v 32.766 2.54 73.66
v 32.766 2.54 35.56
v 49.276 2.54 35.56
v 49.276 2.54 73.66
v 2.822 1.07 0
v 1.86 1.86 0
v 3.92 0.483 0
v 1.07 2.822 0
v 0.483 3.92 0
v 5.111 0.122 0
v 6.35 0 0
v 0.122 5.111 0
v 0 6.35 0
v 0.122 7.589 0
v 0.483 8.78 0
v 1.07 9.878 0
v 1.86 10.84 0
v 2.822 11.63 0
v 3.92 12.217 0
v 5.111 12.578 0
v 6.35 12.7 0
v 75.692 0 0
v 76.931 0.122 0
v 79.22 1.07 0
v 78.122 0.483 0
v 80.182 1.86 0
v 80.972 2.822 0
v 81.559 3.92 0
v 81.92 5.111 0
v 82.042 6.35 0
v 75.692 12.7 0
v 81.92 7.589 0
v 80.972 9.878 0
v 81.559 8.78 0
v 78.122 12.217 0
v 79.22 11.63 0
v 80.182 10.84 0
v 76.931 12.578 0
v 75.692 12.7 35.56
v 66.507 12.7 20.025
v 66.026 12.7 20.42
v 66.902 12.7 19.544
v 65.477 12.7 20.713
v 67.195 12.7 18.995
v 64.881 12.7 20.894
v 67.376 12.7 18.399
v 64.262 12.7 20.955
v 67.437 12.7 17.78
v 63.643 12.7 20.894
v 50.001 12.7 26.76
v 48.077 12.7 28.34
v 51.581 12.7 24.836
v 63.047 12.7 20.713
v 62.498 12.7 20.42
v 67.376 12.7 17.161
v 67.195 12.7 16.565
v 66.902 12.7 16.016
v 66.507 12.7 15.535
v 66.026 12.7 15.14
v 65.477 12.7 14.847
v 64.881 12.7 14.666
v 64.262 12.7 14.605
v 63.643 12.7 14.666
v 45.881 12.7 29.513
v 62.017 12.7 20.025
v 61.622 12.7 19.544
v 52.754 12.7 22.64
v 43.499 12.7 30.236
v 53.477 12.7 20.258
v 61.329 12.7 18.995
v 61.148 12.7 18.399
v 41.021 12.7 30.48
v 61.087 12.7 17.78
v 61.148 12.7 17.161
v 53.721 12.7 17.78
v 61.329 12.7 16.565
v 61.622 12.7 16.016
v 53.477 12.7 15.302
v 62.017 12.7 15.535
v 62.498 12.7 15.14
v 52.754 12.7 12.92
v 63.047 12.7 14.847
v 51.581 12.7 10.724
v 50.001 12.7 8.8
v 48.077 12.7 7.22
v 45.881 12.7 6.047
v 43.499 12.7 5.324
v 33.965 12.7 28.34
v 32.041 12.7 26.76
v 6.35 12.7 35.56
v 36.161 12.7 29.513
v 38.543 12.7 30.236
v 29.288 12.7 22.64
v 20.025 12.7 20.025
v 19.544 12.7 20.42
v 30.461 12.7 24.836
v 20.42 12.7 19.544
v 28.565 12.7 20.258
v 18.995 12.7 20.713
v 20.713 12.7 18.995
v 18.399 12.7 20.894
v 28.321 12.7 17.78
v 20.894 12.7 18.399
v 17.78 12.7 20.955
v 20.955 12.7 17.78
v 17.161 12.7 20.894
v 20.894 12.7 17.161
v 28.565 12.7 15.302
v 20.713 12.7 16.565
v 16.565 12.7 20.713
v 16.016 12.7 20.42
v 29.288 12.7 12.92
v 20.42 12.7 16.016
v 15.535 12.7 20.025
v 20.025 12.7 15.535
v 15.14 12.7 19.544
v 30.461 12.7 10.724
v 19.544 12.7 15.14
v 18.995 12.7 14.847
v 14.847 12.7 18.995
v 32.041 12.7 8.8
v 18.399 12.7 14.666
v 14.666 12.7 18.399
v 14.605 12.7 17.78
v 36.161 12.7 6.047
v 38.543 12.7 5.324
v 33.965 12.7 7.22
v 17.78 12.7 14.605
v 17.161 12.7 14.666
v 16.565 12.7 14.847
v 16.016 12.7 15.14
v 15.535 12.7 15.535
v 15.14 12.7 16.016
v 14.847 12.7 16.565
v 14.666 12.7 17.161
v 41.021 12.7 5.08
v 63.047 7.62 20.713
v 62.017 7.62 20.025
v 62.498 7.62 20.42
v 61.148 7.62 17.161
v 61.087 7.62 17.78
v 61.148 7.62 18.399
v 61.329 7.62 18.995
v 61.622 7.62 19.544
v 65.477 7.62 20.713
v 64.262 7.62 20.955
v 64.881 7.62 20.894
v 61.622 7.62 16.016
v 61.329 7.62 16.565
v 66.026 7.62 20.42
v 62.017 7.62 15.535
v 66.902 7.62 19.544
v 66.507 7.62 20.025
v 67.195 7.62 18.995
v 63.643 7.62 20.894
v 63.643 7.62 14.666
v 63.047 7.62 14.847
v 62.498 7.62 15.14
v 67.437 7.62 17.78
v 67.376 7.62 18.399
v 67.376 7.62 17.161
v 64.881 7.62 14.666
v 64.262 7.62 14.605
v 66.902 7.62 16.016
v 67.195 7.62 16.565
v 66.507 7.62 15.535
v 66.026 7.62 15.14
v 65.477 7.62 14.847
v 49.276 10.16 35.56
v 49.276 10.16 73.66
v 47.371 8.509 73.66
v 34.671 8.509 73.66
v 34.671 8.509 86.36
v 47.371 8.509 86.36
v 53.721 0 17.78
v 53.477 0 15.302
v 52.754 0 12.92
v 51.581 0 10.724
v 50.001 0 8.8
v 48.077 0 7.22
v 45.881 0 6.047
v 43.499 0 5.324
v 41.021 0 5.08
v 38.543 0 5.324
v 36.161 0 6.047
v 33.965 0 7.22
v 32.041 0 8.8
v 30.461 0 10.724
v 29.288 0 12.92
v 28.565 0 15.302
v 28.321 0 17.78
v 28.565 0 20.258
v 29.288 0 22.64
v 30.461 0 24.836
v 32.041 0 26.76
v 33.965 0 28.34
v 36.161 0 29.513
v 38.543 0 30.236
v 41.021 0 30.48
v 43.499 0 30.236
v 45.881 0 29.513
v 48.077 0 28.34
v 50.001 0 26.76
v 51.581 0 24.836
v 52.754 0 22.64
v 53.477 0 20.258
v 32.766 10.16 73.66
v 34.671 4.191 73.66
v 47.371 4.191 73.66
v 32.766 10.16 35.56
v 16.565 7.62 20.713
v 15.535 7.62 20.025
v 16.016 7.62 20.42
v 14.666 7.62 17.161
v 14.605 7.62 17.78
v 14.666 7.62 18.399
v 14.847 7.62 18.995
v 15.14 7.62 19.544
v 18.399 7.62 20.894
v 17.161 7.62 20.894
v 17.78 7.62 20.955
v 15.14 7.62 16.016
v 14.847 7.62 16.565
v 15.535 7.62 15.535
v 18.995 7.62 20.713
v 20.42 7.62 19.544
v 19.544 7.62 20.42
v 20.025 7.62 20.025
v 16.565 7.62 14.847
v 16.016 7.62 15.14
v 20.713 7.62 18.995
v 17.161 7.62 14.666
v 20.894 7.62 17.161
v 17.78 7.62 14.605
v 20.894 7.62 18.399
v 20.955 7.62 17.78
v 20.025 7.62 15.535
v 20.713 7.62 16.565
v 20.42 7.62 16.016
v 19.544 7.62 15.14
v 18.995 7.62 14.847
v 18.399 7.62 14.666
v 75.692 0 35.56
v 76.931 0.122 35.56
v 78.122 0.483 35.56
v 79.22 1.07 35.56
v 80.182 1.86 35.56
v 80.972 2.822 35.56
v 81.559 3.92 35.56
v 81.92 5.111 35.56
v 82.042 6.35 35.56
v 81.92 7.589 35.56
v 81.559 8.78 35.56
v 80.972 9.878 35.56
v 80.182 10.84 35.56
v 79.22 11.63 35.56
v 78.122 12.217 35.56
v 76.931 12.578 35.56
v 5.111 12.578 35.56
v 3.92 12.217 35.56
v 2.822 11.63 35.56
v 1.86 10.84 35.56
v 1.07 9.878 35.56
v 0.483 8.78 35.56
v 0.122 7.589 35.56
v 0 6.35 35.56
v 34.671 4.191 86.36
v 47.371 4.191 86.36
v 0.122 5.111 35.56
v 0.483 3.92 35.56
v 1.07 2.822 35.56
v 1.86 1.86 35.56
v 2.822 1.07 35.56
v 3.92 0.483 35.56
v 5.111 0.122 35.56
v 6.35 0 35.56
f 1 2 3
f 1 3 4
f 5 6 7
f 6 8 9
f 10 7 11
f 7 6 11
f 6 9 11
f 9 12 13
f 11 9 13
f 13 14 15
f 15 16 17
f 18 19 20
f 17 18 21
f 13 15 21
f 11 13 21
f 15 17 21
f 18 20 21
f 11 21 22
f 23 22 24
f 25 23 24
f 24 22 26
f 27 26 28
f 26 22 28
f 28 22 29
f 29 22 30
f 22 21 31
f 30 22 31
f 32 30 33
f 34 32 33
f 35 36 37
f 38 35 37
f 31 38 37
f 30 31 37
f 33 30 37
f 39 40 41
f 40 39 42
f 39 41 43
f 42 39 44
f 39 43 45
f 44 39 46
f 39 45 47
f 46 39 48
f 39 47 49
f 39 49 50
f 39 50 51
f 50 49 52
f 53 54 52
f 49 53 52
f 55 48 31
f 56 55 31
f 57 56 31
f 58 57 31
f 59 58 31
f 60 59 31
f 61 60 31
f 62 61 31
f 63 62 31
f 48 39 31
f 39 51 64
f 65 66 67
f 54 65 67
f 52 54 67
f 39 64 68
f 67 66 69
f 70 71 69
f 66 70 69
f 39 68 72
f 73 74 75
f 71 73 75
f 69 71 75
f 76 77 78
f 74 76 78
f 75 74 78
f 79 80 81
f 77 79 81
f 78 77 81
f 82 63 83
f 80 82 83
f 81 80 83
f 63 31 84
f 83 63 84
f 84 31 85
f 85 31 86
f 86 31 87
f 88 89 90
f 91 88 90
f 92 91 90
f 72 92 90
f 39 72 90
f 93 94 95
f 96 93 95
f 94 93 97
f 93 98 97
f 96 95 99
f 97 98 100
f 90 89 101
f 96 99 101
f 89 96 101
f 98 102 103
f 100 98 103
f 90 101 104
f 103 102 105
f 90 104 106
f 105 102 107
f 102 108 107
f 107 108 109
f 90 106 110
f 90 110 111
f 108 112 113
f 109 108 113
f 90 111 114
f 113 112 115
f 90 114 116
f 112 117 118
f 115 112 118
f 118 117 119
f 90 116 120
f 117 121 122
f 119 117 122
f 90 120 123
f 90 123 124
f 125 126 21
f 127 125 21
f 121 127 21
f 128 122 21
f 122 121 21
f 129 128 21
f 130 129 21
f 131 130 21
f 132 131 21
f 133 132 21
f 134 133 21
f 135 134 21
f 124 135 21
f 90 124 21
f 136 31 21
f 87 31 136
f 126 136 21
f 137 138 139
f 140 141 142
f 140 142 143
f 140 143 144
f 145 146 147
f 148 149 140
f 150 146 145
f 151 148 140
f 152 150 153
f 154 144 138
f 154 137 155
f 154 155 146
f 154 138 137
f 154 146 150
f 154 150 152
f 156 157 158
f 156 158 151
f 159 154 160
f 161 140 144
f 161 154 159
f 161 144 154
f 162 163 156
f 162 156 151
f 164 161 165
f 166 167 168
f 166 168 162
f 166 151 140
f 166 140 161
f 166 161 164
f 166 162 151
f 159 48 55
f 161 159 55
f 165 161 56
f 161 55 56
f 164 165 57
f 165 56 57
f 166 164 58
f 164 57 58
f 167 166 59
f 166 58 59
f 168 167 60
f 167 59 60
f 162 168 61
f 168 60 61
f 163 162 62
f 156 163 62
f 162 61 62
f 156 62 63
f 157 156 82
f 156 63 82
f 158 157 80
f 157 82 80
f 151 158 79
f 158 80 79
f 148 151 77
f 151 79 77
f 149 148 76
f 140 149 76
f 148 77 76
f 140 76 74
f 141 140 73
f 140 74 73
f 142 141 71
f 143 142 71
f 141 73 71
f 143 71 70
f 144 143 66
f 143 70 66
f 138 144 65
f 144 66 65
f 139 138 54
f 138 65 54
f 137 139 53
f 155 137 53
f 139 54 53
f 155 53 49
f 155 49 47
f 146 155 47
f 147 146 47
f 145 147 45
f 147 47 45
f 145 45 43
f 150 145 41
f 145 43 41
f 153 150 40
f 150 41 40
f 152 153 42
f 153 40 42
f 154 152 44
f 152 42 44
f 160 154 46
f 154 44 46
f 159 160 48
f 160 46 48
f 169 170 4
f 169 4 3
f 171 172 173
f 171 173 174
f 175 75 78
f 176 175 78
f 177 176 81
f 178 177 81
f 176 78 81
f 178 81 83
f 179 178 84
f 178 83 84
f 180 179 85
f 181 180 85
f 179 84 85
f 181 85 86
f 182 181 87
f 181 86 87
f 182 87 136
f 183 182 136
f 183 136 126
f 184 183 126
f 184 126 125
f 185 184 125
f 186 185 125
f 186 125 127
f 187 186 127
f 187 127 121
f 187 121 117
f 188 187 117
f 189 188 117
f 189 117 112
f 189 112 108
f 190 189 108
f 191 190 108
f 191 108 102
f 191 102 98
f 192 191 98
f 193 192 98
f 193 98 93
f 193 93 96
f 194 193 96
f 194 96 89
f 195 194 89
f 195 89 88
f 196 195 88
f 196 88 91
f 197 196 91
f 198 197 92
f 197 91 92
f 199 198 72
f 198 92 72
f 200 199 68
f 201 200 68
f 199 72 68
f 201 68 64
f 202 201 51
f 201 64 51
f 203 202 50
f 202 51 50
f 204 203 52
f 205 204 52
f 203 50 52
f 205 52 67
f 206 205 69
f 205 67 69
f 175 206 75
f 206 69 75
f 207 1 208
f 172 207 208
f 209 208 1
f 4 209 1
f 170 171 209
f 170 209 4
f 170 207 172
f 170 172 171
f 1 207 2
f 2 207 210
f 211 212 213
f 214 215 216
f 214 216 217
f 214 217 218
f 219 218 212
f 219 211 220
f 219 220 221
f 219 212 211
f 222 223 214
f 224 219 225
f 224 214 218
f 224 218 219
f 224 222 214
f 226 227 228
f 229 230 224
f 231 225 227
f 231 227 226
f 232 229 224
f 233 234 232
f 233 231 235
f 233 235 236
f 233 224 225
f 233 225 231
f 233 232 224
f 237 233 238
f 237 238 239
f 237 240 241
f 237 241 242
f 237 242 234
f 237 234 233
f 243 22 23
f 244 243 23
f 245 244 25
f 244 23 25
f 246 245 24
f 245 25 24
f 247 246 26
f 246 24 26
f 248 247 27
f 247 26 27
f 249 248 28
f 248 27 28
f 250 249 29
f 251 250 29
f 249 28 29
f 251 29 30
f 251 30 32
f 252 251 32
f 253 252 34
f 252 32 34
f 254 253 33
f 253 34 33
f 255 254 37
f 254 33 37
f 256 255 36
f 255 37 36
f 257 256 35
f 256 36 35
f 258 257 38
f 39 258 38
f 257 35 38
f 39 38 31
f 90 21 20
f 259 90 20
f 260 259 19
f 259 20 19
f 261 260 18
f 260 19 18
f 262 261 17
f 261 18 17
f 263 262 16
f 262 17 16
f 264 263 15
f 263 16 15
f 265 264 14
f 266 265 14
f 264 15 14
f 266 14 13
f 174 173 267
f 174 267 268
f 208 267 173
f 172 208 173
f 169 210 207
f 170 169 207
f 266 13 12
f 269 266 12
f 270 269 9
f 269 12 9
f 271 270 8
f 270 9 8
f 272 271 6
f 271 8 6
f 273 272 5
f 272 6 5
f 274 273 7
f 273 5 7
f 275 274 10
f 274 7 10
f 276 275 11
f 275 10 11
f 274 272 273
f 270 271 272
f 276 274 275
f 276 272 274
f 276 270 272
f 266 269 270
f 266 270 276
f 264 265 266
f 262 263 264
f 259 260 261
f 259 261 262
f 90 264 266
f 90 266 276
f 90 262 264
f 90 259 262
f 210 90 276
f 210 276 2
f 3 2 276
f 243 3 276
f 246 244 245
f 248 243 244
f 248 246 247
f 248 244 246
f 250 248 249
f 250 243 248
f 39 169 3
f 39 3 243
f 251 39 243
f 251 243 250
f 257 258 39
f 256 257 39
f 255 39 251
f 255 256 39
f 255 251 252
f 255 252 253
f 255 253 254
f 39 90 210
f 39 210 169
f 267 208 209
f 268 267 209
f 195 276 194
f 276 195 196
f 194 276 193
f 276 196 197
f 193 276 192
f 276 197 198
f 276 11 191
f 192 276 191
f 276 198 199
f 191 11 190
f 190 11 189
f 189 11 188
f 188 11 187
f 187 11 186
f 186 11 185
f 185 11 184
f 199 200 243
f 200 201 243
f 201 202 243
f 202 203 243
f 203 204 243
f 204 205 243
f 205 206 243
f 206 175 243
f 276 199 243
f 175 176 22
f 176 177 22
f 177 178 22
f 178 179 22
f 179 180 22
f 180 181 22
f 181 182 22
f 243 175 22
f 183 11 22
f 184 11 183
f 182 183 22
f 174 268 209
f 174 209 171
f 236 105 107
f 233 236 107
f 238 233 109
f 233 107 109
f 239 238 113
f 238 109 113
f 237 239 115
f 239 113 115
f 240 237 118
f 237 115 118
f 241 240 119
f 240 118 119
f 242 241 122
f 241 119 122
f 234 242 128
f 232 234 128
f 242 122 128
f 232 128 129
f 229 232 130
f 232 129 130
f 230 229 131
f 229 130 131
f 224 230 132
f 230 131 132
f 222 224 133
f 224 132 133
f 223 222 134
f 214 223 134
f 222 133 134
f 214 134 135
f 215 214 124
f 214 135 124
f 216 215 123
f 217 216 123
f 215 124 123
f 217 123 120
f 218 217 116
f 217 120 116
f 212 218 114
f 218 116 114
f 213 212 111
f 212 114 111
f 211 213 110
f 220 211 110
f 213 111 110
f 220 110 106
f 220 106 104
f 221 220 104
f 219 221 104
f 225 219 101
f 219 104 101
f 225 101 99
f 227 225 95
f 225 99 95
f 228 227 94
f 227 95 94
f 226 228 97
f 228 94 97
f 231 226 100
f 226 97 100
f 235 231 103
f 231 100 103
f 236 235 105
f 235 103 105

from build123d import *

# Parameters (mm, degrees)
BOSS_EXTRUDE1_DEPTH = 35.56
SKETCH2_W           = 16.51
SKETCH2_H           = 38.1
BOSS_EXTRUDE2_DEPTH = 12.7
SKETCH3_W           = 38.1
SKETCH3_H           = 2.54
CUT_EXTRUDE1_DEPTH  = 50.276
SKETCH4_W           = 12.7
SKETCH4_H           = 4.318
BOSS_EXTRUDE3_DEPTH = 12.7
SKETCH5_R           = 12.7
CUT_EXTRUDE2_DEPTH  = 13.7
SKETCH6_R           = 3.175
CUT_EXTRUDE3_DEPTH  = 5.08


with BuildPart() as part:
    # Sketch1 → Boss-Extrude1 (new body)
    with BuildSketch(Plane.XY):
        with BuildLine():
            ThreePointArc((0, 6.35), (1.859871939, 1.859871939), (6.35, 0))
            Line((6.35, 0), (75.692, 0))
            ThreePointArc((75.692, 0), (80.182128061, 1.859871939), (82.042, 6.35))
            ThreePointArc((82.042, 6.35), (80.182128061, 10.840128061), (75.692, 12.7))
            Line((75.692, 12.7), (6.35, 12.7))
            ThreePointArc((6.35, 12.7), (1.859871939, 10.840128061), (0, 6.35))
        make_face()
    extrude(amount=BOSS_EXTRUDE1_DEPTH)

    # Sketch2 → Boss-Extrude2 (add)
    with BuildSketch(Plane(origin=(0, 12.7, 0), x_dir=(1, 0, 0), z_dir=(0, 1, 0))):
        with Locations((41.021, -54.61)):
            Rectangle(SKETCH2_W, SKETCH2_H)
    extrude(amount=-BOSS_EXTRUDE2_DEPTH)

    # Sketch3 → Cut-Extrude1 (cut, through all)
    with BuildSketch(Plane.ZY.offset(-32.766)):
        with Locations((54.61, 11.43)):
            Rectangle(SKETCH3_W, SKETCH3_H)
        with Locations((54.61, 1.27)):
            Rectangle(SKETCH3_W, SKETCH3_H)
    extrude(amount=-CUT_EXTRUDE1_DEPTH, mode=Mode.SUBTRACT)

    # Sketch4 → Boss-Extrude3 (add)
    with BuildSketch(Plane.XY.offset(73.66)):
        with Locations((41.021, 6.35)):
            Rectangle(SKETCH4_W, SKETCH4_H)
    extrude(amount=BOSS_EXTRUDE3_DEPTH)

    # Sketch5 → Cut-Extrude2 (cut, through all)
    with BuildSketch(Plane(origin=(0, 12.7, 0), x_dir=(1, 0, 0), z_dir=(0, 1, 0))):
        with Locations((41.021, -17.78)):
            Circle(SKETCH5_R)
    extrude(amount=-CUT_EXTRUDE2_DEPTH, mode=Mode.SUBTRACT)

    # Sketch6 → Cut-Extrude3 (cut)
    with BuildSketch(Plane(origin=(0, 12.7, 0), x_dir=(1, 0, 0), z_dir=(0, 1, 0))):
        with Locations((64.262, -17.78)):
            Circle(SKETCH6_R)
        with Locations((17.78, -17.78)):
            Circle(SKETCH6_R)
    extrude(amount=-CUT_EXTRUDE3_DEPTH, mode=Mode.SUBTRACT)


solid = part.part
